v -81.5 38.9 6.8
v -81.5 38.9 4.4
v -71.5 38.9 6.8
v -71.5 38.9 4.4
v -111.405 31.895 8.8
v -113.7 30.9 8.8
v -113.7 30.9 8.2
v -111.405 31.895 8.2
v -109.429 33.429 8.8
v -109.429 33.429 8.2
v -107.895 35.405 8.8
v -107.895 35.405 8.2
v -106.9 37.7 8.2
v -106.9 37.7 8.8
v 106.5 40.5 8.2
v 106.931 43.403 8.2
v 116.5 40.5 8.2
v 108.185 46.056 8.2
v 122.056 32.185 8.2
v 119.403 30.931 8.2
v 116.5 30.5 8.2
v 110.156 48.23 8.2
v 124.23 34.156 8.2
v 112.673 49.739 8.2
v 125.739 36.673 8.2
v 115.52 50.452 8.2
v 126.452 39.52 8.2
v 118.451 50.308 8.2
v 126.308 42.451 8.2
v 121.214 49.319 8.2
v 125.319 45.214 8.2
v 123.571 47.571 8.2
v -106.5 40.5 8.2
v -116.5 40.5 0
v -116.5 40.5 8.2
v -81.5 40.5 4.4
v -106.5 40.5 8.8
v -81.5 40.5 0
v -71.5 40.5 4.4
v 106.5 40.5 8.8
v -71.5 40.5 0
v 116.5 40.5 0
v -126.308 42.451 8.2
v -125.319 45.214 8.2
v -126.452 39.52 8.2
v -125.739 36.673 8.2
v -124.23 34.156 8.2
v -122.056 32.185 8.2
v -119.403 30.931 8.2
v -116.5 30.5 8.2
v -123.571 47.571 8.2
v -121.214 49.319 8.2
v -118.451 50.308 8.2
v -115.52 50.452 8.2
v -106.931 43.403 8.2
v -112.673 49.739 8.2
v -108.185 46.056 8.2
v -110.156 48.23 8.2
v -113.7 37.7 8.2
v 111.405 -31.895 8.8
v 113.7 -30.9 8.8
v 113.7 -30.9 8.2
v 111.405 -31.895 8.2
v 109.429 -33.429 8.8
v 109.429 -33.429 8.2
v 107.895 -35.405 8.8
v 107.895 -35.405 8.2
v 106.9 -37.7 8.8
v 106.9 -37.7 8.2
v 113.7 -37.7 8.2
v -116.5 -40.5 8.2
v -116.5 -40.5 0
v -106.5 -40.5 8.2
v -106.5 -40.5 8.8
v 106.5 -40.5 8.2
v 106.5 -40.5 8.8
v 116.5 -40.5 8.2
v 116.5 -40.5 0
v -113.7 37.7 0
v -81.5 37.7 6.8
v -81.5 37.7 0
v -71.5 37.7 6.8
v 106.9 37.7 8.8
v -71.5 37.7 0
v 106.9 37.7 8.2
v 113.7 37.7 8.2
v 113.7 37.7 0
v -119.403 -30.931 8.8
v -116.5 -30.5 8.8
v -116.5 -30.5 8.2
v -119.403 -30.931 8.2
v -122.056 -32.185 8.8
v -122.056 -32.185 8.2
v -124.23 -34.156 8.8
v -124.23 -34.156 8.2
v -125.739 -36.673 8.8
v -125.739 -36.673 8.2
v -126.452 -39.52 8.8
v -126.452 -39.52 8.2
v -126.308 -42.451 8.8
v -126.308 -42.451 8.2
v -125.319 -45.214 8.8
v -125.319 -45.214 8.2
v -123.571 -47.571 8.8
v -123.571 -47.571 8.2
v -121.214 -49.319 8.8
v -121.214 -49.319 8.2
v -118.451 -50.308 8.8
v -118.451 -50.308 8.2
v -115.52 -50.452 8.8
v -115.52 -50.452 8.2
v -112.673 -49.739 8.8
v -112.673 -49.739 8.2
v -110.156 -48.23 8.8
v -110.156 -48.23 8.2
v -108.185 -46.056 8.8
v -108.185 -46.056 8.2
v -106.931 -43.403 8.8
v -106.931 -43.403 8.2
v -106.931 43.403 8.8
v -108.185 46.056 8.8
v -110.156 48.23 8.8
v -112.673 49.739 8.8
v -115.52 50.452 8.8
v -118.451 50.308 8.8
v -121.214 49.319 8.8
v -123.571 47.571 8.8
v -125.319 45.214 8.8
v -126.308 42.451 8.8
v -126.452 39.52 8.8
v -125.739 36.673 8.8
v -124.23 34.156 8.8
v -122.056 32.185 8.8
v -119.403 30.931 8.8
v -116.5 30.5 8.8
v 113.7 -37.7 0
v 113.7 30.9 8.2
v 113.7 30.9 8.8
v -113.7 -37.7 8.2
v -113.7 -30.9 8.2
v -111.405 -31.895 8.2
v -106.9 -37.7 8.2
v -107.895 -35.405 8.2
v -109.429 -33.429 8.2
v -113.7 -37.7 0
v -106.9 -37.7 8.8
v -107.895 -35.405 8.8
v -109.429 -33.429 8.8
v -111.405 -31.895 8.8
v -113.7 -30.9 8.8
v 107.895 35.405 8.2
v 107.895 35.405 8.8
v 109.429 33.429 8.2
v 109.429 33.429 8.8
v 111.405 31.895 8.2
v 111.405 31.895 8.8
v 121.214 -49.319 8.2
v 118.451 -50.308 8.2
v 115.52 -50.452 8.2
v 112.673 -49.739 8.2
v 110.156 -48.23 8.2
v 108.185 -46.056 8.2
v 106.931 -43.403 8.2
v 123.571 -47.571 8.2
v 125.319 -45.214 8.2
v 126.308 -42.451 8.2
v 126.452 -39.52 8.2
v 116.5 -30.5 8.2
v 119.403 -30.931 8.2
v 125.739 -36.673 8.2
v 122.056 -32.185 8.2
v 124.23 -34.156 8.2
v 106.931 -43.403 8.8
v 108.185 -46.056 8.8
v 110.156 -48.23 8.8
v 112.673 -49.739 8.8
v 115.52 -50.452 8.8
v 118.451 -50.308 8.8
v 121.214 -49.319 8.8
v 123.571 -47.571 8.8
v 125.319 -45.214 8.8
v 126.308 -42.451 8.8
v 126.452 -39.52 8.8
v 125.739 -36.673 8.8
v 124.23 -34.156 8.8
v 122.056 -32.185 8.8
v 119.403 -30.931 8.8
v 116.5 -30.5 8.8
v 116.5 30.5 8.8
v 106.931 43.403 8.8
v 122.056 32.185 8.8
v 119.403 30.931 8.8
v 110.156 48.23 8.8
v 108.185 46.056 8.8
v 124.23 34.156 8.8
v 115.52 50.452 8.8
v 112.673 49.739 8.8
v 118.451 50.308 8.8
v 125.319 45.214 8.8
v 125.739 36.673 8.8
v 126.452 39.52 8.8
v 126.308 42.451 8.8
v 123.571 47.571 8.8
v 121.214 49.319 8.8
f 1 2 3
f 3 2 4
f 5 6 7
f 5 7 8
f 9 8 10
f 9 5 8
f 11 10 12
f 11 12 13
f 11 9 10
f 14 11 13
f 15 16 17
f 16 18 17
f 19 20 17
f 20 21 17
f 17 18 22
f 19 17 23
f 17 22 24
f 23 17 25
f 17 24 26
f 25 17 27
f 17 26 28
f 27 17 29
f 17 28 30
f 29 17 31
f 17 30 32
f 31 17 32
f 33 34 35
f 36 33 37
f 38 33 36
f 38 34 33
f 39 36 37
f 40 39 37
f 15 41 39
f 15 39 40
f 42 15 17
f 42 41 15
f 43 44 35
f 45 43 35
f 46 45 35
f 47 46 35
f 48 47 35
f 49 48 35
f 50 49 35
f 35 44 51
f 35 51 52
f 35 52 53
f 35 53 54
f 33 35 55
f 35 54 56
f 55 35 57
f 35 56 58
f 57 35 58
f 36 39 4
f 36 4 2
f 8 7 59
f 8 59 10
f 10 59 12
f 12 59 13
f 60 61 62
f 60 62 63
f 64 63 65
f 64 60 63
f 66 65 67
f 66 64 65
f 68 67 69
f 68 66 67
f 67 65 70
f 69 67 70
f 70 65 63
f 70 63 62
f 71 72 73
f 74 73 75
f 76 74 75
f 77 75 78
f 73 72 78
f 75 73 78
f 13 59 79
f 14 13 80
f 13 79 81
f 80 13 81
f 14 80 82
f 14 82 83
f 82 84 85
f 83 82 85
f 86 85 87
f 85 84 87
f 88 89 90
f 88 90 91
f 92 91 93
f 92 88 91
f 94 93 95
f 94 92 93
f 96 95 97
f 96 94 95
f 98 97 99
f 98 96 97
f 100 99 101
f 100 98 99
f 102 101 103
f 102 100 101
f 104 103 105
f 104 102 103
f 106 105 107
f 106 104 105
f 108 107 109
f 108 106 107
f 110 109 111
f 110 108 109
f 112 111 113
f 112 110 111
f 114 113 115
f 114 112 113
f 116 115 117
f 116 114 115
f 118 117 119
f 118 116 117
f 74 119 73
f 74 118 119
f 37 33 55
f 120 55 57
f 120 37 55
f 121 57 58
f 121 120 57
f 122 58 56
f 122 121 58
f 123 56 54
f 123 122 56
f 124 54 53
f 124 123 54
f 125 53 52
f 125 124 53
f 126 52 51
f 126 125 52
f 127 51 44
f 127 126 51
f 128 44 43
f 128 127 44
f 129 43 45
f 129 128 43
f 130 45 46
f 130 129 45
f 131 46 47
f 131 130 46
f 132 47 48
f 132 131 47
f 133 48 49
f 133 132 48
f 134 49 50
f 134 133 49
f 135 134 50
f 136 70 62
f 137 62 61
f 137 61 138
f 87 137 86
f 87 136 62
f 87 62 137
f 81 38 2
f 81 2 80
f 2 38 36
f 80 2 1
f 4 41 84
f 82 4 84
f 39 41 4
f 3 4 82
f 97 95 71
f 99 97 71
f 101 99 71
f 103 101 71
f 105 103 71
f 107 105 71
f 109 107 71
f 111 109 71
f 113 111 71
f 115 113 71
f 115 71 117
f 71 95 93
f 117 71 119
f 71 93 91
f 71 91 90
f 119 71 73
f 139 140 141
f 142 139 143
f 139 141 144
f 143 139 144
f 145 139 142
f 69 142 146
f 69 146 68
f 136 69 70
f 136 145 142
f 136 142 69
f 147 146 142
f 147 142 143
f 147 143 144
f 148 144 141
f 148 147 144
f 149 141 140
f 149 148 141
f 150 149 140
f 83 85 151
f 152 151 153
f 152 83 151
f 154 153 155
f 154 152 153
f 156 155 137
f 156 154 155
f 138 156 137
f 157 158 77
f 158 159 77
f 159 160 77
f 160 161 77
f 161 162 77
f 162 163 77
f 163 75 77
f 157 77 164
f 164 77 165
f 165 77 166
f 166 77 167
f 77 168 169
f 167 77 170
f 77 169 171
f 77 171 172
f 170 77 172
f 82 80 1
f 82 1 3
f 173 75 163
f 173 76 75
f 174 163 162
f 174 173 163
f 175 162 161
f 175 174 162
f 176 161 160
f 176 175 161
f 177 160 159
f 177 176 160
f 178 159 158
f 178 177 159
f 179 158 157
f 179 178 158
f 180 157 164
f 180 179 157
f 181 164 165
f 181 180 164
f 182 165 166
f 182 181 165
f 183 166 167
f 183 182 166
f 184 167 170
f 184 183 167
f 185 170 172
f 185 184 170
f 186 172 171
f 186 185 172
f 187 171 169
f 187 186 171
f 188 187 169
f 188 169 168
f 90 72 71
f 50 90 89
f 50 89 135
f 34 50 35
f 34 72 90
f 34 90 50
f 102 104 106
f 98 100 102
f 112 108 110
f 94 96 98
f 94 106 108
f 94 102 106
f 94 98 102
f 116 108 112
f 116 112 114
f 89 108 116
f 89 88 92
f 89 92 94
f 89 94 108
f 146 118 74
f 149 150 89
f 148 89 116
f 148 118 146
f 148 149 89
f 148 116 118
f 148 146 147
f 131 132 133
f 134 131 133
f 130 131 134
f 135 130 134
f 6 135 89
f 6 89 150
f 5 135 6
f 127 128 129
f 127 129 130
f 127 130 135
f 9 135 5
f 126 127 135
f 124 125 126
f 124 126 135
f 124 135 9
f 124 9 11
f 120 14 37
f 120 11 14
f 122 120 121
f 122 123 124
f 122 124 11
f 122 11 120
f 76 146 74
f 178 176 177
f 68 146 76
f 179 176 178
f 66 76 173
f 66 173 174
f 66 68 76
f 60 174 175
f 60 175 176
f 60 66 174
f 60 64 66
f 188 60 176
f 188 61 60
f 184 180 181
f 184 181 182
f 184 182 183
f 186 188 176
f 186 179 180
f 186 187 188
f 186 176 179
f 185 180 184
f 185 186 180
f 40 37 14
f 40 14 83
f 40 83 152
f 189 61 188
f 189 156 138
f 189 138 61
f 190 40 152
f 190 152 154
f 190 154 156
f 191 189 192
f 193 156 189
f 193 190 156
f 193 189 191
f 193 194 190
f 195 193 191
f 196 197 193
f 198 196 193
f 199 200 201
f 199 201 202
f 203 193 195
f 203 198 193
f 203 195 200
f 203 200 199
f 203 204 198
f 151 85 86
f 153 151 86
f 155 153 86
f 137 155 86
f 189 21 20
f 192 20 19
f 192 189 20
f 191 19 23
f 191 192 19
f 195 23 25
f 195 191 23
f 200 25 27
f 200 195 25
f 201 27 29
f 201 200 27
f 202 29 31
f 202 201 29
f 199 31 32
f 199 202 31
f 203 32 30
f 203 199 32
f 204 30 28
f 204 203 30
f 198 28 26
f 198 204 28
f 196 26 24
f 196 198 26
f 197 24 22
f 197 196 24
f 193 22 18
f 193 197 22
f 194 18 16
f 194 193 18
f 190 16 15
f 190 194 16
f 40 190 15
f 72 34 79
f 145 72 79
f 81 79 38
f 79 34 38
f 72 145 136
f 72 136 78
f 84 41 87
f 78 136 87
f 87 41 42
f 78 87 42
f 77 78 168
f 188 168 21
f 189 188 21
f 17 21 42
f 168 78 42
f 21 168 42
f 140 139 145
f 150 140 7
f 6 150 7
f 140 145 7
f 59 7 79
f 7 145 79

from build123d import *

# Parameters (mm, degrees)
F0_W     = 233
F0_H     = 81
F0_W_2   = 227.4
F0_H_2   = 75.4
F1_DEPTH = 8.8
F2_W     = 10
F2_H     = 4.4
F3_DEPTH = 25
F4_W     = 10
F4_H     = 1.2
F5_DEPTH = 2.4
F6_R     = 10
F7_DEPTH = 0.6


with BuildPart() as f1:
    # F0 (on Top) → F1 (new body)
    with BuildSketch(Plane.XY):
        Rectangle(F0_W, F0_H)
        Rectangle(F0_W_2, F0_H_2, mode=Mode.SUBTRACT)
    extrude(amount=F1_DEPTH)

    # F2 (on face) → F3 (cut)
    with BuildSketch(Plane(origin=(0, 40.5, 0), x_dir=(-1, 0, 0), z_dir=(0, 1, 0))):
        with Locations((76.5, 2.2)):
            Rectangle(F2_W, F2_H)
    extrude(amount=-F3_DEPTH, mode=Mode.SUBTRACT)

    # F4 (on face) → F5 (cut)
    with BuildSketch(Plane(origin=(0, 0, 4.4), x_dir=(1, 0, 0), z_dir=(0, 0, -1))):
        with Locations((-76.5, -38.3)):
            Rectangle(F4_W, F4_H)
    extrude(amount=-F5_DEPTH, mode=Mode.SUBTRACT)

    # F6 (on face) → F7 (join)
    with BuildSketch(Plane.XY.offset(8.8)):
        with Locations((-116.5, 40.5)):
            Circle(F6_R)
        with Locations((-116.5, -40.5)):
            Circle(F6_R)
        with Locations((116.5, -40.5)):
            Circle(F6_R)
        with Locations((116.5, 40.5)):
            Circle(F6_R)
    extrude(amount=-F7_DEPTH)


solid = f1.part
